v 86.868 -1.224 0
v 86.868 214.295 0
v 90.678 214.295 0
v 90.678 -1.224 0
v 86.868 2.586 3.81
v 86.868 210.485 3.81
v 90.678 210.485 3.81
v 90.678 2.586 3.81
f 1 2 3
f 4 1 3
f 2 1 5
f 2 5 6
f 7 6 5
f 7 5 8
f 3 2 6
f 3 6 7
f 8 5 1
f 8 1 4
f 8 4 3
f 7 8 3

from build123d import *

# Parameters (mm, degrees)
F0_W     = 3.81
F0_H     = 215.519
F1_DEPTH = 3.81
F2_SIZE  = 3.80999
F3_SIZE  = 3.80999


# Not quite as in the source:
# - a fillet or chamfer is up to 0.001 mm smaller than in the source, because OpenCascade refuses the exact size


with BuildPart() as f1:
    # F0 (on Top) → F1 (new body)
    with BuildSketch(Plane.XY):
        with Locations((88.7727327645, 106.5352801529)):
            Rectangle(F0_W, F0_H)
    extrude(amount=F1_DEPTH)

    # F2 (size 3.81 in the source; OpenCascade refuses exactly that, so slightly less here)
    f2_edges = [f1.edges().sort_by_distance(p)[0] for p in [
        (88.772733, -1.22422, 3.81),
    ]]
    chamfer(f2_edges, length=F2_SIZE)

    # F3 (size 3.81 in the source; OpenCascade refuses exactly that, so slightly less here)
    f3_edges = [f1.edges().sort_by_distance(p)[0] for p in [
        (88.772733, 214.29478, 3.81),
    ]]
    chamfer(f3_edges, length=F3_SIZE)


solid = f1.part
